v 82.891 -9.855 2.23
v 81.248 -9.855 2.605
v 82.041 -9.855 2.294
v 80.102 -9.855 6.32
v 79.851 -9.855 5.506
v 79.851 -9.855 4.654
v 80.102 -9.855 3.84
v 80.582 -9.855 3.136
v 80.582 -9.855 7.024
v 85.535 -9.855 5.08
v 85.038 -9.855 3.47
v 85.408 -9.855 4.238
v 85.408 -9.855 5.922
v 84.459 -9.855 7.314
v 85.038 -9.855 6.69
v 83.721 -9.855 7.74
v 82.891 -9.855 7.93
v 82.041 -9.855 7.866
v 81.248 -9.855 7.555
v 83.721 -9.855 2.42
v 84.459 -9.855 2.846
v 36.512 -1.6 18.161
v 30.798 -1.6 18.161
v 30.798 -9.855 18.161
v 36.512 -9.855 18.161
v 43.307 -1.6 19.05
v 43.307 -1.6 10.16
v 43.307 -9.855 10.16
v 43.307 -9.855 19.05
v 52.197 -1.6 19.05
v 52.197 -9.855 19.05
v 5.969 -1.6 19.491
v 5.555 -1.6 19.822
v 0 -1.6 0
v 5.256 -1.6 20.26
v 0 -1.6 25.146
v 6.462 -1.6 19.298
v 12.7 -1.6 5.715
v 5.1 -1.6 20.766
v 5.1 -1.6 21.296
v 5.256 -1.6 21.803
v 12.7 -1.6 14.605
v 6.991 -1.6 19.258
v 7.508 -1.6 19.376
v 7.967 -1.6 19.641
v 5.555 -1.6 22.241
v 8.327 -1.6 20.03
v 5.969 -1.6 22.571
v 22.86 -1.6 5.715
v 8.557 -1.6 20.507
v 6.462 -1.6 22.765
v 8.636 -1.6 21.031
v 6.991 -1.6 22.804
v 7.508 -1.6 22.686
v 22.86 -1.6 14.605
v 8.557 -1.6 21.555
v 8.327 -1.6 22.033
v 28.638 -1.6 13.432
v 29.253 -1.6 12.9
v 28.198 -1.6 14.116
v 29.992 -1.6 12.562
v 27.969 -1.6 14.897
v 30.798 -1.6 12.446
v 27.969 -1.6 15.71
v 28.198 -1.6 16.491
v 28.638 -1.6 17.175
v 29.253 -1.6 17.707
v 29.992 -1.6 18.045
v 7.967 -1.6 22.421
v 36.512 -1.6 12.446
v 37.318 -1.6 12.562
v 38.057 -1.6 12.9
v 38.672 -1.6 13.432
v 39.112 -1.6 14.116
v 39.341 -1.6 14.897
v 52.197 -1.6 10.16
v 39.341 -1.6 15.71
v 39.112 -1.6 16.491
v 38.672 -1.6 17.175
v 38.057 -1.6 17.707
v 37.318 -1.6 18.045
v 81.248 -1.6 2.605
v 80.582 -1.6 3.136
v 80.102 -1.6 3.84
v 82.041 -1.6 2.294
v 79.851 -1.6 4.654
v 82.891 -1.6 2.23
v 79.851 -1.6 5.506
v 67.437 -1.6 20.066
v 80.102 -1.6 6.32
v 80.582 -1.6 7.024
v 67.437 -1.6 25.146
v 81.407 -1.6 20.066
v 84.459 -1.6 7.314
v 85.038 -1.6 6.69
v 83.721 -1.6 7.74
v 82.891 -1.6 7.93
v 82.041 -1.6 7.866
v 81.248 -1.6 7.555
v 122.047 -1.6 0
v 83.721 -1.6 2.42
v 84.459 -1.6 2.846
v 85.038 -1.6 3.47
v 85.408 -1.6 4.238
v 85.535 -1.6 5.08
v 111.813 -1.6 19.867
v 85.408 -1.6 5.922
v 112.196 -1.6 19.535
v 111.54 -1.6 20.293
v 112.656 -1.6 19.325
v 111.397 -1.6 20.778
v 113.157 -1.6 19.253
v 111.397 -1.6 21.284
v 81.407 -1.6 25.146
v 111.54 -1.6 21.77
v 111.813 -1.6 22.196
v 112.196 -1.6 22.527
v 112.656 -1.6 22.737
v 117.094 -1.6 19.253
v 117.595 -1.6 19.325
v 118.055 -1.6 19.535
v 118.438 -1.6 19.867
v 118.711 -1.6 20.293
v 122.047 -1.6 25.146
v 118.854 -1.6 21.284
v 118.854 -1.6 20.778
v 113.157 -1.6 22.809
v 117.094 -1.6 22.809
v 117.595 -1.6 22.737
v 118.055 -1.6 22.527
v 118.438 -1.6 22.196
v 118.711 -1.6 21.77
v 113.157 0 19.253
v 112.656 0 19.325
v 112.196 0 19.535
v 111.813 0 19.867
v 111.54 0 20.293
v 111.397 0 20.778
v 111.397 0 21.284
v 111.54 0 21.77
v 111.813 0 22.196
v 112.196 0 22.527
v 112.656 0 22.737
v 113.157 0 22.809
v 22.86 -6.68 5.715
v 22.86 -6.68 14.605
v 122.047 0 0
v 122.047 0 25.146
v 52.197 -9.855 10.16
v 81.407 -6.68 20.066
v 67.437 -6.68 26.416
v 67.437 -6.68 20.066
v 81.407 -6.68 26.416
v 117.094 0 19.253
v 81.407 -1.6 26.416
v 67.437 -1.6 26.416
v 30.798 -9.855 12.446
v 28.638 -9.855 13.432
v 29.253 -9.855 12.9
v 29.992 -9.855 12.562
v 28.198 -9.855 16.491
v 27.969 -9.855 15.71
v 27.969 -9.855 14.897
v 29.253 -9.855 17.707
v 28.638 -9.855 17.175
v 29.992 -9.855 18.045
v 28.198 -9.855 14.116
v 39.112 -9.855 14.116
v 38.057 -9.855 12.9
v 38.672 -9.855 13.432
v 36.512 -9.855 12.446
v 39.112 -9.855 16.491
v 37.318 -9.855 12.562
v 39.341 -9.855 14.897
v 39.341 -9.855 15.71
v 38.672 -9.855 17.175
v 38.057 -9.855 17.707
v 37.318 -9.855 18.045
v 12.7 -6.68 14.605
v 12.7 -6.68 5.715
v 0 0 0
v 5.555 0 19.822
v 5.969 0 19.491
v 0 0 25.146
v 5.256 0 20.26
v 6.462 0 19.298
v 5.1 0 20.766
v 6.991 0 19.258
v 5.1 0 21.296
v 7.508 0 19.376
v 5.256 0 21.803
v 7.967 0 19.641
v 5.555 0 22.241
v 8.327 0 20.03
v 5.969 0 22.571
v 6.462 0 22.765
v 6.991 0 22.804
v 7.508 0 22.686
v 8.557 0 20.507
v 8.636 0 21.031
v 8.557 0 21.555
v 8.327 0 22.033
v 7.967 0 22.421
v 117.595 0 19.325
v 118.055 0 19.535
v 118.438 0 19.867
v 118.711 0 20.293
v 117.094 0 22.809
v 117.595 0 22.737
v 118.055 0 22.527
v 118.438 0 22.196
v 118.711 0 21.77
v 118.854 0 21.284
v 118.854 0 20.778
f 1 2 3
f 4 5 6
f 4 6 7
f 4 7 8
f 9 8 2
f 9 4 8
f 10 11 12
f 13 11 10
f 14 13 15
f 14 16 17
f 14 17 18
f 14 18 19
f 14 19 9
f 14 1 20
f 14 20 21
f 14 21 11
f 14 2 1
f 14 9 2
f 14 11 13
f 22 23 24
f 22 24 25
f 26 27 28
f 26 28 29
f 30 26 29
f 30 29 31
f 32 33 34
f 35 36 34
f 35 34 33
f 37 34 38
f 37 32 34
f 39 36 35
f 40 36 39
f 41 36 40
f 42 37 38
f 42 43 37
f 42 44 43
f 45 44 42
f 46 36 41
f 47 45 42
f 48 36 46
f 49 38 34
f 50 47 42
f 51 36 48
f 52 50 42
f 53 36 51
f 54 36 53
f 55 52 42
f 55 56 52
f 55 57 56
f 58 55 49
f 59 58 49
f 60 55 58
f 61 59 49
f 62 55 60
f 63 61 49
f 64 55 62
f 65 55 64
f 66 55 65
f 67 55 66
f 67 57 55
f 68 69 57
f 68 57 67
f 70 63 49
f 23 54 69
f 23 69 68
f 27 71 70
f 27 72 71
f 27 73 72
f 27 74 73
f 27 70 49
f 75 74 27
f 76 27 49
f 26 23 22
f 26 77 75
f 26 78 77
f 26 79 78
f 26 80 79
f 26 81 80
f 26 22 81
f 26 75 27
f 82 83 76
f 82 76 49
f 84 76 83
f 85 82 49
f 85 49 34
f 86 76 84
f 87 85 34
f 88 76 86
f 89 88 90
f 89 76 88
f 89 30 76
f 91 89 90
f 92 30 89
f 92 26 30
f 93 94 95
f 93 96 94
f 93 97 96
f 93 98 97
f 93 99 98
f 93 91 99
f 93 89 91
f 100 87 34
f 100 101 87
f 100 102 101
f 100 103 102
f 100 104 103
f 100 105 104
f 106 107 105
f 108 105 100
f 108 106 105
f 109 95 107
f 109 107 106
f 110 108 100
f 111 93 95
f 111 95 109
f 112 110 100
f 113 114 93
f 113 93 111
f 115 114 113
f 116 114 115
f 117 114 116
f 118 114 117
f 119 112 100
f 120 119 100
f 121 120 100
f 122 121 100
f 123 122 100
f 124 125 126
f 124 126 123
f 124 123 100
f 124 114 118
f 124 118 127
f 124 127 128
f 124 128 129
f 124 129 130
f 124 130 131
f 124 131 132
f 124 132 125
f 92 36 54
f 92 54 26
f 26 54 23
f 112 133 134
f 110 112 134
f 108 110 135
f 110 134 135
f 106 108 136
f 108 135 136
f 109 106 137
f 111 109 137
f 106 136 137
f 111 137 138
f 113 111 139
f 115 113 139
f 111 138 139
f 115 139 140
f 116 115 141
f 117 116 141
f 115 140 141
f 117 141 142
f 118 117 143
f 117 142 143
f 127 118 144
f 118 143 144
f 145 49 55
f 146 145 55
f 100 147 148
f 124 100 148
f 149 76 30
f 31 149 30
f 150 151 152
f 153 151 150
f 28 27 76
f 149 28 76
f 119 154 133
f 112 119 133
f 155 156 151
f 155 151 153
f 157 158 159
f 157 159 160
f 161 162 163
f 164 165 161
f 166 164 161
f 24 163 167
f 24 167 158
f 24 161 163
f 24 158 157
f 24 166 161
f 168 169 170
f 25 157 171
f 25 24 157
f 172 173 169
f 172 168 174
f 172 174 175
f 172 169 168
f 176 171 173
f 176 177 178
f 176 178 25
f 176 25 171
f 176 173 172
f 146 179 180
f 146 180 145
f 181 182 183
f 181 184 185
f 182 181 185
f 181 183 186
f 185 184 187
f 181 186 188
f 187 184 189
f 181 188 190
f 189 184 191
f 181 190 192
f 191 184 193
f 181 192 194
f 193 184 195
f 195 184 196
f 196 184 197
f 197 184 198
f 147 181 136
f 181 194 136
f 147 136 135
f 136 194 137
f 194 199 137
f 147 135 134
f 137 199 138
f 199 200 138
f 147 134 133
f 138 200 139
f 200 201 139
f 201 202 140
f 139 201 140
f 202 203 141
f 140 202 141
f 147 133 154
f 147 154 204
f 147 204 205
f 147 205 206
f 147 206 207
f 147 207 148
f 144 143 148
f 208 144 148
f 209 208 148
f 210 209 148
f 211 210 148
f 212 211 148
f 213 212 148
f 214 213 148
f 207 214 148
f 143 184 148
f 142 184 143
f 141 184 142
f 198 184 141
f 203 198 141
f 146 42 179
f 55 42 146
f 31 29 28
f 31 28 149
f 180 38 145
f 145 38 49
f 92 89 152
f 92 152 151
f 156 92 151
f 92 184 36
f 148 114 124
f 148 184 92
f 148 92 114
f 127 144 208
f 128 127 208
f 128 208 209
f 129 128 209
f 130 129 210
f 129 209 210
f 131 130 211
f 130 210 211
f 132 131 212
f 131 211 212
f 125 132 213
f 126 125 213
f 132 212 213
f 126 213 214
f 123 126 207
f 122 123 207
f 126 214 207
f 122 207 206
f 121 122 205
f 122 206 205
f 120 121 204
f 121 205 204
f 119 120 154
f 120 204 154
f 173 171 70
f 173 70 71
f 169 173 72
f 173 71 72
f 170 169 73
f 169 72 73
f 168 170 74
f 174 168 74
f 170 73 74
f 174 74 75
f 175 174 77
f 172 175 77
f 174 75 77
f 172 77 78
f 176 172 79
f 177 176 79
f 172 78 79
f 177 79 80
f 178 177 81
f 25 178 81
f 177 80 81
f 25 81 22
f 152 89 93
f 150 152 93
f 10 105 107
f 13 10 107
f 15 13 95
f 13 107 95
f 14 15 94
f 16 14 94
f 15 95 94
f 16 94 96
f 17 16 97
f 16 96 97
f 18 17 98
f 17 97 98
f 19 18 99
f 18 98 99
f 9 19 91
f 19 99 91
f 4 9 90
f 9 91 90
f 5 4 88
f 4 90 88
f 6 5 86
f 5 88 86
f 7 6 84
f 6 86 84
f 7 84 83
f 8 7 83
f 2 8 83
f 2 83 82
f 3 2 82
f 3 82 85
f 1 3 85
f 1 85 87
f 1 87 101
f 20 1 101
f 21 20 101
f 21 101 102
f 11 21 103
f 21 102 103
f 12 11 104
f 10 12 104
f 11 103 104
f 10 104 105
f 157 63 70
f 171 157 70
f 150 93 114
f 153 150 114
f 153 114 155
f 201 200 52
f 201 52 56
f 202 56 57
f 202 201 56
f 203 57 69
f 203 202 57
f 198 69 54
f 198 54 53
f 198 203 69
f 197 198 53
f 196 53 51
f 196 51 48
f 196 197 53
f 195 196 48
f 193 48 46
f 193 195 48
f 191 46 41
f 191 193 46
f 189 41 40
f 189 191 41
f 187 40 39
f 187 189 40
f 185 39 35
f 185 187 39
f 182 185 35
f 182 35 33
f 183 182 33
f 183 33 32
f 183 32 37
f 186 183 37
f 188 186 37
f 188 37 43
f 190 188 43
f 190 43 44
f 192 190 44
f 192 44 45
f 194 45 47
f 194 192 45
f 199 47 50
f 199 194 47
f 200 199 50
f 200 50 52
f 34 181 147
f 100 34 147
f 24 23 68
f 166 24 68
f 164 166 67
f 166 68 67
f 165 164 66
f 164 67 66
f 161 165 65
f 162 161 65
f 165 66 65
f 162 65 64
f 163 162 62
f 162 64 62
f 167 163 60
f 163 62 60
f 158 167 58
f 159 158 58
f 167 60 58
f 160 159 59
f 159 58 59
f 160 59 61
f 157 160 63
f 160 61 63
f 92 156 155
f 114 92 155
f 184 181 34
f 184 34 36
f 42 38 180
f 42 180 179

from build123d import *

# Parameters (mm, degrees)
F0_W     = 122.047
F0_H     = 25.146
F0_R     = 1.778
F1_DEPTH = 1.6002
F2_W     = 10.16
F2_H     = 8.89
F2_W_2   = 13.97
F2_H_2   = 6.35
F3_DEPTH = 5.08
F4_W     = 8.89
F4_H     = 8.89
F4_R     = 2.8575
F4_W_2   = 5.715
F4_H_2   = 5.715
F5_DEPTH = 8.255


with BuildPart() as f1:
    # F0 (on Front) → F1 (new body)
    with BuildSketch(Plane.XZ):
        with Locations((61.0235, 12.573)):
            Rectangle(F0_W, F0_H)
        with Locations((6.858, 21.0312)):
            Circle(F0_R, mode=Mode.SUBTRACT)
        with BuildLine():
            ThreePointArc((113.157, 19.2532), (111.379, 21.0312), (113.157, 22.8092))
            Line((113.157, 22.8092), (117.094, 22.8092))
            ThreePointArc((117.094, 22.8092), (118.872, 21.0312), (117.094, 19.2532))
            Line((117.094, 19.2532), (113.157, 19.2532))
        make_face(mode=Mode.SUBTRACT)
    extrude(amount=F1_DEPTH)

    # F2 (on face) → F3 (join)
    with BuildSketch(Plane.XZ.offset(1.6002)):
        with Locations((17.78, 10.16)):
            Rectangle(F2_W, F2_H)
        with Locations((74.422, 23.241)):
            Rectangle(F2_W_2, F2_H_2)
    extrude(amount=F3_DEPTH)

    # F4 (on face) → F5 (join)
    with BuildSketch(Plane.XZ.offset(1.6002)):
        with Locations((47.752, 14.605)):
            Rectangle(F4_W, F4_H)
        with Locations((82.677, 5.08)):
            Circle(F4_R)
        with Locations((33.655, 15.3035)):
            Rectangle(F4_W_2, F4_H_2)
        with BuildLine():
            Line((30.7975, 12.446), (30.7975, 18.161))
            ThreePointArc((30.7975, 18.161), (27.94, 15.3035), (30.7975, 12.446))
        make_face()
        with BuildLine():
            ThreePointArc((36.5125, 12.446), (39.37, 15.3035), (36.5125, 18.161))
            Line((36.5125, 18.161), (36.5125, 12.446))
        make_face()
    extrude(amount=F5_DEPTH)


solid = f1.part
